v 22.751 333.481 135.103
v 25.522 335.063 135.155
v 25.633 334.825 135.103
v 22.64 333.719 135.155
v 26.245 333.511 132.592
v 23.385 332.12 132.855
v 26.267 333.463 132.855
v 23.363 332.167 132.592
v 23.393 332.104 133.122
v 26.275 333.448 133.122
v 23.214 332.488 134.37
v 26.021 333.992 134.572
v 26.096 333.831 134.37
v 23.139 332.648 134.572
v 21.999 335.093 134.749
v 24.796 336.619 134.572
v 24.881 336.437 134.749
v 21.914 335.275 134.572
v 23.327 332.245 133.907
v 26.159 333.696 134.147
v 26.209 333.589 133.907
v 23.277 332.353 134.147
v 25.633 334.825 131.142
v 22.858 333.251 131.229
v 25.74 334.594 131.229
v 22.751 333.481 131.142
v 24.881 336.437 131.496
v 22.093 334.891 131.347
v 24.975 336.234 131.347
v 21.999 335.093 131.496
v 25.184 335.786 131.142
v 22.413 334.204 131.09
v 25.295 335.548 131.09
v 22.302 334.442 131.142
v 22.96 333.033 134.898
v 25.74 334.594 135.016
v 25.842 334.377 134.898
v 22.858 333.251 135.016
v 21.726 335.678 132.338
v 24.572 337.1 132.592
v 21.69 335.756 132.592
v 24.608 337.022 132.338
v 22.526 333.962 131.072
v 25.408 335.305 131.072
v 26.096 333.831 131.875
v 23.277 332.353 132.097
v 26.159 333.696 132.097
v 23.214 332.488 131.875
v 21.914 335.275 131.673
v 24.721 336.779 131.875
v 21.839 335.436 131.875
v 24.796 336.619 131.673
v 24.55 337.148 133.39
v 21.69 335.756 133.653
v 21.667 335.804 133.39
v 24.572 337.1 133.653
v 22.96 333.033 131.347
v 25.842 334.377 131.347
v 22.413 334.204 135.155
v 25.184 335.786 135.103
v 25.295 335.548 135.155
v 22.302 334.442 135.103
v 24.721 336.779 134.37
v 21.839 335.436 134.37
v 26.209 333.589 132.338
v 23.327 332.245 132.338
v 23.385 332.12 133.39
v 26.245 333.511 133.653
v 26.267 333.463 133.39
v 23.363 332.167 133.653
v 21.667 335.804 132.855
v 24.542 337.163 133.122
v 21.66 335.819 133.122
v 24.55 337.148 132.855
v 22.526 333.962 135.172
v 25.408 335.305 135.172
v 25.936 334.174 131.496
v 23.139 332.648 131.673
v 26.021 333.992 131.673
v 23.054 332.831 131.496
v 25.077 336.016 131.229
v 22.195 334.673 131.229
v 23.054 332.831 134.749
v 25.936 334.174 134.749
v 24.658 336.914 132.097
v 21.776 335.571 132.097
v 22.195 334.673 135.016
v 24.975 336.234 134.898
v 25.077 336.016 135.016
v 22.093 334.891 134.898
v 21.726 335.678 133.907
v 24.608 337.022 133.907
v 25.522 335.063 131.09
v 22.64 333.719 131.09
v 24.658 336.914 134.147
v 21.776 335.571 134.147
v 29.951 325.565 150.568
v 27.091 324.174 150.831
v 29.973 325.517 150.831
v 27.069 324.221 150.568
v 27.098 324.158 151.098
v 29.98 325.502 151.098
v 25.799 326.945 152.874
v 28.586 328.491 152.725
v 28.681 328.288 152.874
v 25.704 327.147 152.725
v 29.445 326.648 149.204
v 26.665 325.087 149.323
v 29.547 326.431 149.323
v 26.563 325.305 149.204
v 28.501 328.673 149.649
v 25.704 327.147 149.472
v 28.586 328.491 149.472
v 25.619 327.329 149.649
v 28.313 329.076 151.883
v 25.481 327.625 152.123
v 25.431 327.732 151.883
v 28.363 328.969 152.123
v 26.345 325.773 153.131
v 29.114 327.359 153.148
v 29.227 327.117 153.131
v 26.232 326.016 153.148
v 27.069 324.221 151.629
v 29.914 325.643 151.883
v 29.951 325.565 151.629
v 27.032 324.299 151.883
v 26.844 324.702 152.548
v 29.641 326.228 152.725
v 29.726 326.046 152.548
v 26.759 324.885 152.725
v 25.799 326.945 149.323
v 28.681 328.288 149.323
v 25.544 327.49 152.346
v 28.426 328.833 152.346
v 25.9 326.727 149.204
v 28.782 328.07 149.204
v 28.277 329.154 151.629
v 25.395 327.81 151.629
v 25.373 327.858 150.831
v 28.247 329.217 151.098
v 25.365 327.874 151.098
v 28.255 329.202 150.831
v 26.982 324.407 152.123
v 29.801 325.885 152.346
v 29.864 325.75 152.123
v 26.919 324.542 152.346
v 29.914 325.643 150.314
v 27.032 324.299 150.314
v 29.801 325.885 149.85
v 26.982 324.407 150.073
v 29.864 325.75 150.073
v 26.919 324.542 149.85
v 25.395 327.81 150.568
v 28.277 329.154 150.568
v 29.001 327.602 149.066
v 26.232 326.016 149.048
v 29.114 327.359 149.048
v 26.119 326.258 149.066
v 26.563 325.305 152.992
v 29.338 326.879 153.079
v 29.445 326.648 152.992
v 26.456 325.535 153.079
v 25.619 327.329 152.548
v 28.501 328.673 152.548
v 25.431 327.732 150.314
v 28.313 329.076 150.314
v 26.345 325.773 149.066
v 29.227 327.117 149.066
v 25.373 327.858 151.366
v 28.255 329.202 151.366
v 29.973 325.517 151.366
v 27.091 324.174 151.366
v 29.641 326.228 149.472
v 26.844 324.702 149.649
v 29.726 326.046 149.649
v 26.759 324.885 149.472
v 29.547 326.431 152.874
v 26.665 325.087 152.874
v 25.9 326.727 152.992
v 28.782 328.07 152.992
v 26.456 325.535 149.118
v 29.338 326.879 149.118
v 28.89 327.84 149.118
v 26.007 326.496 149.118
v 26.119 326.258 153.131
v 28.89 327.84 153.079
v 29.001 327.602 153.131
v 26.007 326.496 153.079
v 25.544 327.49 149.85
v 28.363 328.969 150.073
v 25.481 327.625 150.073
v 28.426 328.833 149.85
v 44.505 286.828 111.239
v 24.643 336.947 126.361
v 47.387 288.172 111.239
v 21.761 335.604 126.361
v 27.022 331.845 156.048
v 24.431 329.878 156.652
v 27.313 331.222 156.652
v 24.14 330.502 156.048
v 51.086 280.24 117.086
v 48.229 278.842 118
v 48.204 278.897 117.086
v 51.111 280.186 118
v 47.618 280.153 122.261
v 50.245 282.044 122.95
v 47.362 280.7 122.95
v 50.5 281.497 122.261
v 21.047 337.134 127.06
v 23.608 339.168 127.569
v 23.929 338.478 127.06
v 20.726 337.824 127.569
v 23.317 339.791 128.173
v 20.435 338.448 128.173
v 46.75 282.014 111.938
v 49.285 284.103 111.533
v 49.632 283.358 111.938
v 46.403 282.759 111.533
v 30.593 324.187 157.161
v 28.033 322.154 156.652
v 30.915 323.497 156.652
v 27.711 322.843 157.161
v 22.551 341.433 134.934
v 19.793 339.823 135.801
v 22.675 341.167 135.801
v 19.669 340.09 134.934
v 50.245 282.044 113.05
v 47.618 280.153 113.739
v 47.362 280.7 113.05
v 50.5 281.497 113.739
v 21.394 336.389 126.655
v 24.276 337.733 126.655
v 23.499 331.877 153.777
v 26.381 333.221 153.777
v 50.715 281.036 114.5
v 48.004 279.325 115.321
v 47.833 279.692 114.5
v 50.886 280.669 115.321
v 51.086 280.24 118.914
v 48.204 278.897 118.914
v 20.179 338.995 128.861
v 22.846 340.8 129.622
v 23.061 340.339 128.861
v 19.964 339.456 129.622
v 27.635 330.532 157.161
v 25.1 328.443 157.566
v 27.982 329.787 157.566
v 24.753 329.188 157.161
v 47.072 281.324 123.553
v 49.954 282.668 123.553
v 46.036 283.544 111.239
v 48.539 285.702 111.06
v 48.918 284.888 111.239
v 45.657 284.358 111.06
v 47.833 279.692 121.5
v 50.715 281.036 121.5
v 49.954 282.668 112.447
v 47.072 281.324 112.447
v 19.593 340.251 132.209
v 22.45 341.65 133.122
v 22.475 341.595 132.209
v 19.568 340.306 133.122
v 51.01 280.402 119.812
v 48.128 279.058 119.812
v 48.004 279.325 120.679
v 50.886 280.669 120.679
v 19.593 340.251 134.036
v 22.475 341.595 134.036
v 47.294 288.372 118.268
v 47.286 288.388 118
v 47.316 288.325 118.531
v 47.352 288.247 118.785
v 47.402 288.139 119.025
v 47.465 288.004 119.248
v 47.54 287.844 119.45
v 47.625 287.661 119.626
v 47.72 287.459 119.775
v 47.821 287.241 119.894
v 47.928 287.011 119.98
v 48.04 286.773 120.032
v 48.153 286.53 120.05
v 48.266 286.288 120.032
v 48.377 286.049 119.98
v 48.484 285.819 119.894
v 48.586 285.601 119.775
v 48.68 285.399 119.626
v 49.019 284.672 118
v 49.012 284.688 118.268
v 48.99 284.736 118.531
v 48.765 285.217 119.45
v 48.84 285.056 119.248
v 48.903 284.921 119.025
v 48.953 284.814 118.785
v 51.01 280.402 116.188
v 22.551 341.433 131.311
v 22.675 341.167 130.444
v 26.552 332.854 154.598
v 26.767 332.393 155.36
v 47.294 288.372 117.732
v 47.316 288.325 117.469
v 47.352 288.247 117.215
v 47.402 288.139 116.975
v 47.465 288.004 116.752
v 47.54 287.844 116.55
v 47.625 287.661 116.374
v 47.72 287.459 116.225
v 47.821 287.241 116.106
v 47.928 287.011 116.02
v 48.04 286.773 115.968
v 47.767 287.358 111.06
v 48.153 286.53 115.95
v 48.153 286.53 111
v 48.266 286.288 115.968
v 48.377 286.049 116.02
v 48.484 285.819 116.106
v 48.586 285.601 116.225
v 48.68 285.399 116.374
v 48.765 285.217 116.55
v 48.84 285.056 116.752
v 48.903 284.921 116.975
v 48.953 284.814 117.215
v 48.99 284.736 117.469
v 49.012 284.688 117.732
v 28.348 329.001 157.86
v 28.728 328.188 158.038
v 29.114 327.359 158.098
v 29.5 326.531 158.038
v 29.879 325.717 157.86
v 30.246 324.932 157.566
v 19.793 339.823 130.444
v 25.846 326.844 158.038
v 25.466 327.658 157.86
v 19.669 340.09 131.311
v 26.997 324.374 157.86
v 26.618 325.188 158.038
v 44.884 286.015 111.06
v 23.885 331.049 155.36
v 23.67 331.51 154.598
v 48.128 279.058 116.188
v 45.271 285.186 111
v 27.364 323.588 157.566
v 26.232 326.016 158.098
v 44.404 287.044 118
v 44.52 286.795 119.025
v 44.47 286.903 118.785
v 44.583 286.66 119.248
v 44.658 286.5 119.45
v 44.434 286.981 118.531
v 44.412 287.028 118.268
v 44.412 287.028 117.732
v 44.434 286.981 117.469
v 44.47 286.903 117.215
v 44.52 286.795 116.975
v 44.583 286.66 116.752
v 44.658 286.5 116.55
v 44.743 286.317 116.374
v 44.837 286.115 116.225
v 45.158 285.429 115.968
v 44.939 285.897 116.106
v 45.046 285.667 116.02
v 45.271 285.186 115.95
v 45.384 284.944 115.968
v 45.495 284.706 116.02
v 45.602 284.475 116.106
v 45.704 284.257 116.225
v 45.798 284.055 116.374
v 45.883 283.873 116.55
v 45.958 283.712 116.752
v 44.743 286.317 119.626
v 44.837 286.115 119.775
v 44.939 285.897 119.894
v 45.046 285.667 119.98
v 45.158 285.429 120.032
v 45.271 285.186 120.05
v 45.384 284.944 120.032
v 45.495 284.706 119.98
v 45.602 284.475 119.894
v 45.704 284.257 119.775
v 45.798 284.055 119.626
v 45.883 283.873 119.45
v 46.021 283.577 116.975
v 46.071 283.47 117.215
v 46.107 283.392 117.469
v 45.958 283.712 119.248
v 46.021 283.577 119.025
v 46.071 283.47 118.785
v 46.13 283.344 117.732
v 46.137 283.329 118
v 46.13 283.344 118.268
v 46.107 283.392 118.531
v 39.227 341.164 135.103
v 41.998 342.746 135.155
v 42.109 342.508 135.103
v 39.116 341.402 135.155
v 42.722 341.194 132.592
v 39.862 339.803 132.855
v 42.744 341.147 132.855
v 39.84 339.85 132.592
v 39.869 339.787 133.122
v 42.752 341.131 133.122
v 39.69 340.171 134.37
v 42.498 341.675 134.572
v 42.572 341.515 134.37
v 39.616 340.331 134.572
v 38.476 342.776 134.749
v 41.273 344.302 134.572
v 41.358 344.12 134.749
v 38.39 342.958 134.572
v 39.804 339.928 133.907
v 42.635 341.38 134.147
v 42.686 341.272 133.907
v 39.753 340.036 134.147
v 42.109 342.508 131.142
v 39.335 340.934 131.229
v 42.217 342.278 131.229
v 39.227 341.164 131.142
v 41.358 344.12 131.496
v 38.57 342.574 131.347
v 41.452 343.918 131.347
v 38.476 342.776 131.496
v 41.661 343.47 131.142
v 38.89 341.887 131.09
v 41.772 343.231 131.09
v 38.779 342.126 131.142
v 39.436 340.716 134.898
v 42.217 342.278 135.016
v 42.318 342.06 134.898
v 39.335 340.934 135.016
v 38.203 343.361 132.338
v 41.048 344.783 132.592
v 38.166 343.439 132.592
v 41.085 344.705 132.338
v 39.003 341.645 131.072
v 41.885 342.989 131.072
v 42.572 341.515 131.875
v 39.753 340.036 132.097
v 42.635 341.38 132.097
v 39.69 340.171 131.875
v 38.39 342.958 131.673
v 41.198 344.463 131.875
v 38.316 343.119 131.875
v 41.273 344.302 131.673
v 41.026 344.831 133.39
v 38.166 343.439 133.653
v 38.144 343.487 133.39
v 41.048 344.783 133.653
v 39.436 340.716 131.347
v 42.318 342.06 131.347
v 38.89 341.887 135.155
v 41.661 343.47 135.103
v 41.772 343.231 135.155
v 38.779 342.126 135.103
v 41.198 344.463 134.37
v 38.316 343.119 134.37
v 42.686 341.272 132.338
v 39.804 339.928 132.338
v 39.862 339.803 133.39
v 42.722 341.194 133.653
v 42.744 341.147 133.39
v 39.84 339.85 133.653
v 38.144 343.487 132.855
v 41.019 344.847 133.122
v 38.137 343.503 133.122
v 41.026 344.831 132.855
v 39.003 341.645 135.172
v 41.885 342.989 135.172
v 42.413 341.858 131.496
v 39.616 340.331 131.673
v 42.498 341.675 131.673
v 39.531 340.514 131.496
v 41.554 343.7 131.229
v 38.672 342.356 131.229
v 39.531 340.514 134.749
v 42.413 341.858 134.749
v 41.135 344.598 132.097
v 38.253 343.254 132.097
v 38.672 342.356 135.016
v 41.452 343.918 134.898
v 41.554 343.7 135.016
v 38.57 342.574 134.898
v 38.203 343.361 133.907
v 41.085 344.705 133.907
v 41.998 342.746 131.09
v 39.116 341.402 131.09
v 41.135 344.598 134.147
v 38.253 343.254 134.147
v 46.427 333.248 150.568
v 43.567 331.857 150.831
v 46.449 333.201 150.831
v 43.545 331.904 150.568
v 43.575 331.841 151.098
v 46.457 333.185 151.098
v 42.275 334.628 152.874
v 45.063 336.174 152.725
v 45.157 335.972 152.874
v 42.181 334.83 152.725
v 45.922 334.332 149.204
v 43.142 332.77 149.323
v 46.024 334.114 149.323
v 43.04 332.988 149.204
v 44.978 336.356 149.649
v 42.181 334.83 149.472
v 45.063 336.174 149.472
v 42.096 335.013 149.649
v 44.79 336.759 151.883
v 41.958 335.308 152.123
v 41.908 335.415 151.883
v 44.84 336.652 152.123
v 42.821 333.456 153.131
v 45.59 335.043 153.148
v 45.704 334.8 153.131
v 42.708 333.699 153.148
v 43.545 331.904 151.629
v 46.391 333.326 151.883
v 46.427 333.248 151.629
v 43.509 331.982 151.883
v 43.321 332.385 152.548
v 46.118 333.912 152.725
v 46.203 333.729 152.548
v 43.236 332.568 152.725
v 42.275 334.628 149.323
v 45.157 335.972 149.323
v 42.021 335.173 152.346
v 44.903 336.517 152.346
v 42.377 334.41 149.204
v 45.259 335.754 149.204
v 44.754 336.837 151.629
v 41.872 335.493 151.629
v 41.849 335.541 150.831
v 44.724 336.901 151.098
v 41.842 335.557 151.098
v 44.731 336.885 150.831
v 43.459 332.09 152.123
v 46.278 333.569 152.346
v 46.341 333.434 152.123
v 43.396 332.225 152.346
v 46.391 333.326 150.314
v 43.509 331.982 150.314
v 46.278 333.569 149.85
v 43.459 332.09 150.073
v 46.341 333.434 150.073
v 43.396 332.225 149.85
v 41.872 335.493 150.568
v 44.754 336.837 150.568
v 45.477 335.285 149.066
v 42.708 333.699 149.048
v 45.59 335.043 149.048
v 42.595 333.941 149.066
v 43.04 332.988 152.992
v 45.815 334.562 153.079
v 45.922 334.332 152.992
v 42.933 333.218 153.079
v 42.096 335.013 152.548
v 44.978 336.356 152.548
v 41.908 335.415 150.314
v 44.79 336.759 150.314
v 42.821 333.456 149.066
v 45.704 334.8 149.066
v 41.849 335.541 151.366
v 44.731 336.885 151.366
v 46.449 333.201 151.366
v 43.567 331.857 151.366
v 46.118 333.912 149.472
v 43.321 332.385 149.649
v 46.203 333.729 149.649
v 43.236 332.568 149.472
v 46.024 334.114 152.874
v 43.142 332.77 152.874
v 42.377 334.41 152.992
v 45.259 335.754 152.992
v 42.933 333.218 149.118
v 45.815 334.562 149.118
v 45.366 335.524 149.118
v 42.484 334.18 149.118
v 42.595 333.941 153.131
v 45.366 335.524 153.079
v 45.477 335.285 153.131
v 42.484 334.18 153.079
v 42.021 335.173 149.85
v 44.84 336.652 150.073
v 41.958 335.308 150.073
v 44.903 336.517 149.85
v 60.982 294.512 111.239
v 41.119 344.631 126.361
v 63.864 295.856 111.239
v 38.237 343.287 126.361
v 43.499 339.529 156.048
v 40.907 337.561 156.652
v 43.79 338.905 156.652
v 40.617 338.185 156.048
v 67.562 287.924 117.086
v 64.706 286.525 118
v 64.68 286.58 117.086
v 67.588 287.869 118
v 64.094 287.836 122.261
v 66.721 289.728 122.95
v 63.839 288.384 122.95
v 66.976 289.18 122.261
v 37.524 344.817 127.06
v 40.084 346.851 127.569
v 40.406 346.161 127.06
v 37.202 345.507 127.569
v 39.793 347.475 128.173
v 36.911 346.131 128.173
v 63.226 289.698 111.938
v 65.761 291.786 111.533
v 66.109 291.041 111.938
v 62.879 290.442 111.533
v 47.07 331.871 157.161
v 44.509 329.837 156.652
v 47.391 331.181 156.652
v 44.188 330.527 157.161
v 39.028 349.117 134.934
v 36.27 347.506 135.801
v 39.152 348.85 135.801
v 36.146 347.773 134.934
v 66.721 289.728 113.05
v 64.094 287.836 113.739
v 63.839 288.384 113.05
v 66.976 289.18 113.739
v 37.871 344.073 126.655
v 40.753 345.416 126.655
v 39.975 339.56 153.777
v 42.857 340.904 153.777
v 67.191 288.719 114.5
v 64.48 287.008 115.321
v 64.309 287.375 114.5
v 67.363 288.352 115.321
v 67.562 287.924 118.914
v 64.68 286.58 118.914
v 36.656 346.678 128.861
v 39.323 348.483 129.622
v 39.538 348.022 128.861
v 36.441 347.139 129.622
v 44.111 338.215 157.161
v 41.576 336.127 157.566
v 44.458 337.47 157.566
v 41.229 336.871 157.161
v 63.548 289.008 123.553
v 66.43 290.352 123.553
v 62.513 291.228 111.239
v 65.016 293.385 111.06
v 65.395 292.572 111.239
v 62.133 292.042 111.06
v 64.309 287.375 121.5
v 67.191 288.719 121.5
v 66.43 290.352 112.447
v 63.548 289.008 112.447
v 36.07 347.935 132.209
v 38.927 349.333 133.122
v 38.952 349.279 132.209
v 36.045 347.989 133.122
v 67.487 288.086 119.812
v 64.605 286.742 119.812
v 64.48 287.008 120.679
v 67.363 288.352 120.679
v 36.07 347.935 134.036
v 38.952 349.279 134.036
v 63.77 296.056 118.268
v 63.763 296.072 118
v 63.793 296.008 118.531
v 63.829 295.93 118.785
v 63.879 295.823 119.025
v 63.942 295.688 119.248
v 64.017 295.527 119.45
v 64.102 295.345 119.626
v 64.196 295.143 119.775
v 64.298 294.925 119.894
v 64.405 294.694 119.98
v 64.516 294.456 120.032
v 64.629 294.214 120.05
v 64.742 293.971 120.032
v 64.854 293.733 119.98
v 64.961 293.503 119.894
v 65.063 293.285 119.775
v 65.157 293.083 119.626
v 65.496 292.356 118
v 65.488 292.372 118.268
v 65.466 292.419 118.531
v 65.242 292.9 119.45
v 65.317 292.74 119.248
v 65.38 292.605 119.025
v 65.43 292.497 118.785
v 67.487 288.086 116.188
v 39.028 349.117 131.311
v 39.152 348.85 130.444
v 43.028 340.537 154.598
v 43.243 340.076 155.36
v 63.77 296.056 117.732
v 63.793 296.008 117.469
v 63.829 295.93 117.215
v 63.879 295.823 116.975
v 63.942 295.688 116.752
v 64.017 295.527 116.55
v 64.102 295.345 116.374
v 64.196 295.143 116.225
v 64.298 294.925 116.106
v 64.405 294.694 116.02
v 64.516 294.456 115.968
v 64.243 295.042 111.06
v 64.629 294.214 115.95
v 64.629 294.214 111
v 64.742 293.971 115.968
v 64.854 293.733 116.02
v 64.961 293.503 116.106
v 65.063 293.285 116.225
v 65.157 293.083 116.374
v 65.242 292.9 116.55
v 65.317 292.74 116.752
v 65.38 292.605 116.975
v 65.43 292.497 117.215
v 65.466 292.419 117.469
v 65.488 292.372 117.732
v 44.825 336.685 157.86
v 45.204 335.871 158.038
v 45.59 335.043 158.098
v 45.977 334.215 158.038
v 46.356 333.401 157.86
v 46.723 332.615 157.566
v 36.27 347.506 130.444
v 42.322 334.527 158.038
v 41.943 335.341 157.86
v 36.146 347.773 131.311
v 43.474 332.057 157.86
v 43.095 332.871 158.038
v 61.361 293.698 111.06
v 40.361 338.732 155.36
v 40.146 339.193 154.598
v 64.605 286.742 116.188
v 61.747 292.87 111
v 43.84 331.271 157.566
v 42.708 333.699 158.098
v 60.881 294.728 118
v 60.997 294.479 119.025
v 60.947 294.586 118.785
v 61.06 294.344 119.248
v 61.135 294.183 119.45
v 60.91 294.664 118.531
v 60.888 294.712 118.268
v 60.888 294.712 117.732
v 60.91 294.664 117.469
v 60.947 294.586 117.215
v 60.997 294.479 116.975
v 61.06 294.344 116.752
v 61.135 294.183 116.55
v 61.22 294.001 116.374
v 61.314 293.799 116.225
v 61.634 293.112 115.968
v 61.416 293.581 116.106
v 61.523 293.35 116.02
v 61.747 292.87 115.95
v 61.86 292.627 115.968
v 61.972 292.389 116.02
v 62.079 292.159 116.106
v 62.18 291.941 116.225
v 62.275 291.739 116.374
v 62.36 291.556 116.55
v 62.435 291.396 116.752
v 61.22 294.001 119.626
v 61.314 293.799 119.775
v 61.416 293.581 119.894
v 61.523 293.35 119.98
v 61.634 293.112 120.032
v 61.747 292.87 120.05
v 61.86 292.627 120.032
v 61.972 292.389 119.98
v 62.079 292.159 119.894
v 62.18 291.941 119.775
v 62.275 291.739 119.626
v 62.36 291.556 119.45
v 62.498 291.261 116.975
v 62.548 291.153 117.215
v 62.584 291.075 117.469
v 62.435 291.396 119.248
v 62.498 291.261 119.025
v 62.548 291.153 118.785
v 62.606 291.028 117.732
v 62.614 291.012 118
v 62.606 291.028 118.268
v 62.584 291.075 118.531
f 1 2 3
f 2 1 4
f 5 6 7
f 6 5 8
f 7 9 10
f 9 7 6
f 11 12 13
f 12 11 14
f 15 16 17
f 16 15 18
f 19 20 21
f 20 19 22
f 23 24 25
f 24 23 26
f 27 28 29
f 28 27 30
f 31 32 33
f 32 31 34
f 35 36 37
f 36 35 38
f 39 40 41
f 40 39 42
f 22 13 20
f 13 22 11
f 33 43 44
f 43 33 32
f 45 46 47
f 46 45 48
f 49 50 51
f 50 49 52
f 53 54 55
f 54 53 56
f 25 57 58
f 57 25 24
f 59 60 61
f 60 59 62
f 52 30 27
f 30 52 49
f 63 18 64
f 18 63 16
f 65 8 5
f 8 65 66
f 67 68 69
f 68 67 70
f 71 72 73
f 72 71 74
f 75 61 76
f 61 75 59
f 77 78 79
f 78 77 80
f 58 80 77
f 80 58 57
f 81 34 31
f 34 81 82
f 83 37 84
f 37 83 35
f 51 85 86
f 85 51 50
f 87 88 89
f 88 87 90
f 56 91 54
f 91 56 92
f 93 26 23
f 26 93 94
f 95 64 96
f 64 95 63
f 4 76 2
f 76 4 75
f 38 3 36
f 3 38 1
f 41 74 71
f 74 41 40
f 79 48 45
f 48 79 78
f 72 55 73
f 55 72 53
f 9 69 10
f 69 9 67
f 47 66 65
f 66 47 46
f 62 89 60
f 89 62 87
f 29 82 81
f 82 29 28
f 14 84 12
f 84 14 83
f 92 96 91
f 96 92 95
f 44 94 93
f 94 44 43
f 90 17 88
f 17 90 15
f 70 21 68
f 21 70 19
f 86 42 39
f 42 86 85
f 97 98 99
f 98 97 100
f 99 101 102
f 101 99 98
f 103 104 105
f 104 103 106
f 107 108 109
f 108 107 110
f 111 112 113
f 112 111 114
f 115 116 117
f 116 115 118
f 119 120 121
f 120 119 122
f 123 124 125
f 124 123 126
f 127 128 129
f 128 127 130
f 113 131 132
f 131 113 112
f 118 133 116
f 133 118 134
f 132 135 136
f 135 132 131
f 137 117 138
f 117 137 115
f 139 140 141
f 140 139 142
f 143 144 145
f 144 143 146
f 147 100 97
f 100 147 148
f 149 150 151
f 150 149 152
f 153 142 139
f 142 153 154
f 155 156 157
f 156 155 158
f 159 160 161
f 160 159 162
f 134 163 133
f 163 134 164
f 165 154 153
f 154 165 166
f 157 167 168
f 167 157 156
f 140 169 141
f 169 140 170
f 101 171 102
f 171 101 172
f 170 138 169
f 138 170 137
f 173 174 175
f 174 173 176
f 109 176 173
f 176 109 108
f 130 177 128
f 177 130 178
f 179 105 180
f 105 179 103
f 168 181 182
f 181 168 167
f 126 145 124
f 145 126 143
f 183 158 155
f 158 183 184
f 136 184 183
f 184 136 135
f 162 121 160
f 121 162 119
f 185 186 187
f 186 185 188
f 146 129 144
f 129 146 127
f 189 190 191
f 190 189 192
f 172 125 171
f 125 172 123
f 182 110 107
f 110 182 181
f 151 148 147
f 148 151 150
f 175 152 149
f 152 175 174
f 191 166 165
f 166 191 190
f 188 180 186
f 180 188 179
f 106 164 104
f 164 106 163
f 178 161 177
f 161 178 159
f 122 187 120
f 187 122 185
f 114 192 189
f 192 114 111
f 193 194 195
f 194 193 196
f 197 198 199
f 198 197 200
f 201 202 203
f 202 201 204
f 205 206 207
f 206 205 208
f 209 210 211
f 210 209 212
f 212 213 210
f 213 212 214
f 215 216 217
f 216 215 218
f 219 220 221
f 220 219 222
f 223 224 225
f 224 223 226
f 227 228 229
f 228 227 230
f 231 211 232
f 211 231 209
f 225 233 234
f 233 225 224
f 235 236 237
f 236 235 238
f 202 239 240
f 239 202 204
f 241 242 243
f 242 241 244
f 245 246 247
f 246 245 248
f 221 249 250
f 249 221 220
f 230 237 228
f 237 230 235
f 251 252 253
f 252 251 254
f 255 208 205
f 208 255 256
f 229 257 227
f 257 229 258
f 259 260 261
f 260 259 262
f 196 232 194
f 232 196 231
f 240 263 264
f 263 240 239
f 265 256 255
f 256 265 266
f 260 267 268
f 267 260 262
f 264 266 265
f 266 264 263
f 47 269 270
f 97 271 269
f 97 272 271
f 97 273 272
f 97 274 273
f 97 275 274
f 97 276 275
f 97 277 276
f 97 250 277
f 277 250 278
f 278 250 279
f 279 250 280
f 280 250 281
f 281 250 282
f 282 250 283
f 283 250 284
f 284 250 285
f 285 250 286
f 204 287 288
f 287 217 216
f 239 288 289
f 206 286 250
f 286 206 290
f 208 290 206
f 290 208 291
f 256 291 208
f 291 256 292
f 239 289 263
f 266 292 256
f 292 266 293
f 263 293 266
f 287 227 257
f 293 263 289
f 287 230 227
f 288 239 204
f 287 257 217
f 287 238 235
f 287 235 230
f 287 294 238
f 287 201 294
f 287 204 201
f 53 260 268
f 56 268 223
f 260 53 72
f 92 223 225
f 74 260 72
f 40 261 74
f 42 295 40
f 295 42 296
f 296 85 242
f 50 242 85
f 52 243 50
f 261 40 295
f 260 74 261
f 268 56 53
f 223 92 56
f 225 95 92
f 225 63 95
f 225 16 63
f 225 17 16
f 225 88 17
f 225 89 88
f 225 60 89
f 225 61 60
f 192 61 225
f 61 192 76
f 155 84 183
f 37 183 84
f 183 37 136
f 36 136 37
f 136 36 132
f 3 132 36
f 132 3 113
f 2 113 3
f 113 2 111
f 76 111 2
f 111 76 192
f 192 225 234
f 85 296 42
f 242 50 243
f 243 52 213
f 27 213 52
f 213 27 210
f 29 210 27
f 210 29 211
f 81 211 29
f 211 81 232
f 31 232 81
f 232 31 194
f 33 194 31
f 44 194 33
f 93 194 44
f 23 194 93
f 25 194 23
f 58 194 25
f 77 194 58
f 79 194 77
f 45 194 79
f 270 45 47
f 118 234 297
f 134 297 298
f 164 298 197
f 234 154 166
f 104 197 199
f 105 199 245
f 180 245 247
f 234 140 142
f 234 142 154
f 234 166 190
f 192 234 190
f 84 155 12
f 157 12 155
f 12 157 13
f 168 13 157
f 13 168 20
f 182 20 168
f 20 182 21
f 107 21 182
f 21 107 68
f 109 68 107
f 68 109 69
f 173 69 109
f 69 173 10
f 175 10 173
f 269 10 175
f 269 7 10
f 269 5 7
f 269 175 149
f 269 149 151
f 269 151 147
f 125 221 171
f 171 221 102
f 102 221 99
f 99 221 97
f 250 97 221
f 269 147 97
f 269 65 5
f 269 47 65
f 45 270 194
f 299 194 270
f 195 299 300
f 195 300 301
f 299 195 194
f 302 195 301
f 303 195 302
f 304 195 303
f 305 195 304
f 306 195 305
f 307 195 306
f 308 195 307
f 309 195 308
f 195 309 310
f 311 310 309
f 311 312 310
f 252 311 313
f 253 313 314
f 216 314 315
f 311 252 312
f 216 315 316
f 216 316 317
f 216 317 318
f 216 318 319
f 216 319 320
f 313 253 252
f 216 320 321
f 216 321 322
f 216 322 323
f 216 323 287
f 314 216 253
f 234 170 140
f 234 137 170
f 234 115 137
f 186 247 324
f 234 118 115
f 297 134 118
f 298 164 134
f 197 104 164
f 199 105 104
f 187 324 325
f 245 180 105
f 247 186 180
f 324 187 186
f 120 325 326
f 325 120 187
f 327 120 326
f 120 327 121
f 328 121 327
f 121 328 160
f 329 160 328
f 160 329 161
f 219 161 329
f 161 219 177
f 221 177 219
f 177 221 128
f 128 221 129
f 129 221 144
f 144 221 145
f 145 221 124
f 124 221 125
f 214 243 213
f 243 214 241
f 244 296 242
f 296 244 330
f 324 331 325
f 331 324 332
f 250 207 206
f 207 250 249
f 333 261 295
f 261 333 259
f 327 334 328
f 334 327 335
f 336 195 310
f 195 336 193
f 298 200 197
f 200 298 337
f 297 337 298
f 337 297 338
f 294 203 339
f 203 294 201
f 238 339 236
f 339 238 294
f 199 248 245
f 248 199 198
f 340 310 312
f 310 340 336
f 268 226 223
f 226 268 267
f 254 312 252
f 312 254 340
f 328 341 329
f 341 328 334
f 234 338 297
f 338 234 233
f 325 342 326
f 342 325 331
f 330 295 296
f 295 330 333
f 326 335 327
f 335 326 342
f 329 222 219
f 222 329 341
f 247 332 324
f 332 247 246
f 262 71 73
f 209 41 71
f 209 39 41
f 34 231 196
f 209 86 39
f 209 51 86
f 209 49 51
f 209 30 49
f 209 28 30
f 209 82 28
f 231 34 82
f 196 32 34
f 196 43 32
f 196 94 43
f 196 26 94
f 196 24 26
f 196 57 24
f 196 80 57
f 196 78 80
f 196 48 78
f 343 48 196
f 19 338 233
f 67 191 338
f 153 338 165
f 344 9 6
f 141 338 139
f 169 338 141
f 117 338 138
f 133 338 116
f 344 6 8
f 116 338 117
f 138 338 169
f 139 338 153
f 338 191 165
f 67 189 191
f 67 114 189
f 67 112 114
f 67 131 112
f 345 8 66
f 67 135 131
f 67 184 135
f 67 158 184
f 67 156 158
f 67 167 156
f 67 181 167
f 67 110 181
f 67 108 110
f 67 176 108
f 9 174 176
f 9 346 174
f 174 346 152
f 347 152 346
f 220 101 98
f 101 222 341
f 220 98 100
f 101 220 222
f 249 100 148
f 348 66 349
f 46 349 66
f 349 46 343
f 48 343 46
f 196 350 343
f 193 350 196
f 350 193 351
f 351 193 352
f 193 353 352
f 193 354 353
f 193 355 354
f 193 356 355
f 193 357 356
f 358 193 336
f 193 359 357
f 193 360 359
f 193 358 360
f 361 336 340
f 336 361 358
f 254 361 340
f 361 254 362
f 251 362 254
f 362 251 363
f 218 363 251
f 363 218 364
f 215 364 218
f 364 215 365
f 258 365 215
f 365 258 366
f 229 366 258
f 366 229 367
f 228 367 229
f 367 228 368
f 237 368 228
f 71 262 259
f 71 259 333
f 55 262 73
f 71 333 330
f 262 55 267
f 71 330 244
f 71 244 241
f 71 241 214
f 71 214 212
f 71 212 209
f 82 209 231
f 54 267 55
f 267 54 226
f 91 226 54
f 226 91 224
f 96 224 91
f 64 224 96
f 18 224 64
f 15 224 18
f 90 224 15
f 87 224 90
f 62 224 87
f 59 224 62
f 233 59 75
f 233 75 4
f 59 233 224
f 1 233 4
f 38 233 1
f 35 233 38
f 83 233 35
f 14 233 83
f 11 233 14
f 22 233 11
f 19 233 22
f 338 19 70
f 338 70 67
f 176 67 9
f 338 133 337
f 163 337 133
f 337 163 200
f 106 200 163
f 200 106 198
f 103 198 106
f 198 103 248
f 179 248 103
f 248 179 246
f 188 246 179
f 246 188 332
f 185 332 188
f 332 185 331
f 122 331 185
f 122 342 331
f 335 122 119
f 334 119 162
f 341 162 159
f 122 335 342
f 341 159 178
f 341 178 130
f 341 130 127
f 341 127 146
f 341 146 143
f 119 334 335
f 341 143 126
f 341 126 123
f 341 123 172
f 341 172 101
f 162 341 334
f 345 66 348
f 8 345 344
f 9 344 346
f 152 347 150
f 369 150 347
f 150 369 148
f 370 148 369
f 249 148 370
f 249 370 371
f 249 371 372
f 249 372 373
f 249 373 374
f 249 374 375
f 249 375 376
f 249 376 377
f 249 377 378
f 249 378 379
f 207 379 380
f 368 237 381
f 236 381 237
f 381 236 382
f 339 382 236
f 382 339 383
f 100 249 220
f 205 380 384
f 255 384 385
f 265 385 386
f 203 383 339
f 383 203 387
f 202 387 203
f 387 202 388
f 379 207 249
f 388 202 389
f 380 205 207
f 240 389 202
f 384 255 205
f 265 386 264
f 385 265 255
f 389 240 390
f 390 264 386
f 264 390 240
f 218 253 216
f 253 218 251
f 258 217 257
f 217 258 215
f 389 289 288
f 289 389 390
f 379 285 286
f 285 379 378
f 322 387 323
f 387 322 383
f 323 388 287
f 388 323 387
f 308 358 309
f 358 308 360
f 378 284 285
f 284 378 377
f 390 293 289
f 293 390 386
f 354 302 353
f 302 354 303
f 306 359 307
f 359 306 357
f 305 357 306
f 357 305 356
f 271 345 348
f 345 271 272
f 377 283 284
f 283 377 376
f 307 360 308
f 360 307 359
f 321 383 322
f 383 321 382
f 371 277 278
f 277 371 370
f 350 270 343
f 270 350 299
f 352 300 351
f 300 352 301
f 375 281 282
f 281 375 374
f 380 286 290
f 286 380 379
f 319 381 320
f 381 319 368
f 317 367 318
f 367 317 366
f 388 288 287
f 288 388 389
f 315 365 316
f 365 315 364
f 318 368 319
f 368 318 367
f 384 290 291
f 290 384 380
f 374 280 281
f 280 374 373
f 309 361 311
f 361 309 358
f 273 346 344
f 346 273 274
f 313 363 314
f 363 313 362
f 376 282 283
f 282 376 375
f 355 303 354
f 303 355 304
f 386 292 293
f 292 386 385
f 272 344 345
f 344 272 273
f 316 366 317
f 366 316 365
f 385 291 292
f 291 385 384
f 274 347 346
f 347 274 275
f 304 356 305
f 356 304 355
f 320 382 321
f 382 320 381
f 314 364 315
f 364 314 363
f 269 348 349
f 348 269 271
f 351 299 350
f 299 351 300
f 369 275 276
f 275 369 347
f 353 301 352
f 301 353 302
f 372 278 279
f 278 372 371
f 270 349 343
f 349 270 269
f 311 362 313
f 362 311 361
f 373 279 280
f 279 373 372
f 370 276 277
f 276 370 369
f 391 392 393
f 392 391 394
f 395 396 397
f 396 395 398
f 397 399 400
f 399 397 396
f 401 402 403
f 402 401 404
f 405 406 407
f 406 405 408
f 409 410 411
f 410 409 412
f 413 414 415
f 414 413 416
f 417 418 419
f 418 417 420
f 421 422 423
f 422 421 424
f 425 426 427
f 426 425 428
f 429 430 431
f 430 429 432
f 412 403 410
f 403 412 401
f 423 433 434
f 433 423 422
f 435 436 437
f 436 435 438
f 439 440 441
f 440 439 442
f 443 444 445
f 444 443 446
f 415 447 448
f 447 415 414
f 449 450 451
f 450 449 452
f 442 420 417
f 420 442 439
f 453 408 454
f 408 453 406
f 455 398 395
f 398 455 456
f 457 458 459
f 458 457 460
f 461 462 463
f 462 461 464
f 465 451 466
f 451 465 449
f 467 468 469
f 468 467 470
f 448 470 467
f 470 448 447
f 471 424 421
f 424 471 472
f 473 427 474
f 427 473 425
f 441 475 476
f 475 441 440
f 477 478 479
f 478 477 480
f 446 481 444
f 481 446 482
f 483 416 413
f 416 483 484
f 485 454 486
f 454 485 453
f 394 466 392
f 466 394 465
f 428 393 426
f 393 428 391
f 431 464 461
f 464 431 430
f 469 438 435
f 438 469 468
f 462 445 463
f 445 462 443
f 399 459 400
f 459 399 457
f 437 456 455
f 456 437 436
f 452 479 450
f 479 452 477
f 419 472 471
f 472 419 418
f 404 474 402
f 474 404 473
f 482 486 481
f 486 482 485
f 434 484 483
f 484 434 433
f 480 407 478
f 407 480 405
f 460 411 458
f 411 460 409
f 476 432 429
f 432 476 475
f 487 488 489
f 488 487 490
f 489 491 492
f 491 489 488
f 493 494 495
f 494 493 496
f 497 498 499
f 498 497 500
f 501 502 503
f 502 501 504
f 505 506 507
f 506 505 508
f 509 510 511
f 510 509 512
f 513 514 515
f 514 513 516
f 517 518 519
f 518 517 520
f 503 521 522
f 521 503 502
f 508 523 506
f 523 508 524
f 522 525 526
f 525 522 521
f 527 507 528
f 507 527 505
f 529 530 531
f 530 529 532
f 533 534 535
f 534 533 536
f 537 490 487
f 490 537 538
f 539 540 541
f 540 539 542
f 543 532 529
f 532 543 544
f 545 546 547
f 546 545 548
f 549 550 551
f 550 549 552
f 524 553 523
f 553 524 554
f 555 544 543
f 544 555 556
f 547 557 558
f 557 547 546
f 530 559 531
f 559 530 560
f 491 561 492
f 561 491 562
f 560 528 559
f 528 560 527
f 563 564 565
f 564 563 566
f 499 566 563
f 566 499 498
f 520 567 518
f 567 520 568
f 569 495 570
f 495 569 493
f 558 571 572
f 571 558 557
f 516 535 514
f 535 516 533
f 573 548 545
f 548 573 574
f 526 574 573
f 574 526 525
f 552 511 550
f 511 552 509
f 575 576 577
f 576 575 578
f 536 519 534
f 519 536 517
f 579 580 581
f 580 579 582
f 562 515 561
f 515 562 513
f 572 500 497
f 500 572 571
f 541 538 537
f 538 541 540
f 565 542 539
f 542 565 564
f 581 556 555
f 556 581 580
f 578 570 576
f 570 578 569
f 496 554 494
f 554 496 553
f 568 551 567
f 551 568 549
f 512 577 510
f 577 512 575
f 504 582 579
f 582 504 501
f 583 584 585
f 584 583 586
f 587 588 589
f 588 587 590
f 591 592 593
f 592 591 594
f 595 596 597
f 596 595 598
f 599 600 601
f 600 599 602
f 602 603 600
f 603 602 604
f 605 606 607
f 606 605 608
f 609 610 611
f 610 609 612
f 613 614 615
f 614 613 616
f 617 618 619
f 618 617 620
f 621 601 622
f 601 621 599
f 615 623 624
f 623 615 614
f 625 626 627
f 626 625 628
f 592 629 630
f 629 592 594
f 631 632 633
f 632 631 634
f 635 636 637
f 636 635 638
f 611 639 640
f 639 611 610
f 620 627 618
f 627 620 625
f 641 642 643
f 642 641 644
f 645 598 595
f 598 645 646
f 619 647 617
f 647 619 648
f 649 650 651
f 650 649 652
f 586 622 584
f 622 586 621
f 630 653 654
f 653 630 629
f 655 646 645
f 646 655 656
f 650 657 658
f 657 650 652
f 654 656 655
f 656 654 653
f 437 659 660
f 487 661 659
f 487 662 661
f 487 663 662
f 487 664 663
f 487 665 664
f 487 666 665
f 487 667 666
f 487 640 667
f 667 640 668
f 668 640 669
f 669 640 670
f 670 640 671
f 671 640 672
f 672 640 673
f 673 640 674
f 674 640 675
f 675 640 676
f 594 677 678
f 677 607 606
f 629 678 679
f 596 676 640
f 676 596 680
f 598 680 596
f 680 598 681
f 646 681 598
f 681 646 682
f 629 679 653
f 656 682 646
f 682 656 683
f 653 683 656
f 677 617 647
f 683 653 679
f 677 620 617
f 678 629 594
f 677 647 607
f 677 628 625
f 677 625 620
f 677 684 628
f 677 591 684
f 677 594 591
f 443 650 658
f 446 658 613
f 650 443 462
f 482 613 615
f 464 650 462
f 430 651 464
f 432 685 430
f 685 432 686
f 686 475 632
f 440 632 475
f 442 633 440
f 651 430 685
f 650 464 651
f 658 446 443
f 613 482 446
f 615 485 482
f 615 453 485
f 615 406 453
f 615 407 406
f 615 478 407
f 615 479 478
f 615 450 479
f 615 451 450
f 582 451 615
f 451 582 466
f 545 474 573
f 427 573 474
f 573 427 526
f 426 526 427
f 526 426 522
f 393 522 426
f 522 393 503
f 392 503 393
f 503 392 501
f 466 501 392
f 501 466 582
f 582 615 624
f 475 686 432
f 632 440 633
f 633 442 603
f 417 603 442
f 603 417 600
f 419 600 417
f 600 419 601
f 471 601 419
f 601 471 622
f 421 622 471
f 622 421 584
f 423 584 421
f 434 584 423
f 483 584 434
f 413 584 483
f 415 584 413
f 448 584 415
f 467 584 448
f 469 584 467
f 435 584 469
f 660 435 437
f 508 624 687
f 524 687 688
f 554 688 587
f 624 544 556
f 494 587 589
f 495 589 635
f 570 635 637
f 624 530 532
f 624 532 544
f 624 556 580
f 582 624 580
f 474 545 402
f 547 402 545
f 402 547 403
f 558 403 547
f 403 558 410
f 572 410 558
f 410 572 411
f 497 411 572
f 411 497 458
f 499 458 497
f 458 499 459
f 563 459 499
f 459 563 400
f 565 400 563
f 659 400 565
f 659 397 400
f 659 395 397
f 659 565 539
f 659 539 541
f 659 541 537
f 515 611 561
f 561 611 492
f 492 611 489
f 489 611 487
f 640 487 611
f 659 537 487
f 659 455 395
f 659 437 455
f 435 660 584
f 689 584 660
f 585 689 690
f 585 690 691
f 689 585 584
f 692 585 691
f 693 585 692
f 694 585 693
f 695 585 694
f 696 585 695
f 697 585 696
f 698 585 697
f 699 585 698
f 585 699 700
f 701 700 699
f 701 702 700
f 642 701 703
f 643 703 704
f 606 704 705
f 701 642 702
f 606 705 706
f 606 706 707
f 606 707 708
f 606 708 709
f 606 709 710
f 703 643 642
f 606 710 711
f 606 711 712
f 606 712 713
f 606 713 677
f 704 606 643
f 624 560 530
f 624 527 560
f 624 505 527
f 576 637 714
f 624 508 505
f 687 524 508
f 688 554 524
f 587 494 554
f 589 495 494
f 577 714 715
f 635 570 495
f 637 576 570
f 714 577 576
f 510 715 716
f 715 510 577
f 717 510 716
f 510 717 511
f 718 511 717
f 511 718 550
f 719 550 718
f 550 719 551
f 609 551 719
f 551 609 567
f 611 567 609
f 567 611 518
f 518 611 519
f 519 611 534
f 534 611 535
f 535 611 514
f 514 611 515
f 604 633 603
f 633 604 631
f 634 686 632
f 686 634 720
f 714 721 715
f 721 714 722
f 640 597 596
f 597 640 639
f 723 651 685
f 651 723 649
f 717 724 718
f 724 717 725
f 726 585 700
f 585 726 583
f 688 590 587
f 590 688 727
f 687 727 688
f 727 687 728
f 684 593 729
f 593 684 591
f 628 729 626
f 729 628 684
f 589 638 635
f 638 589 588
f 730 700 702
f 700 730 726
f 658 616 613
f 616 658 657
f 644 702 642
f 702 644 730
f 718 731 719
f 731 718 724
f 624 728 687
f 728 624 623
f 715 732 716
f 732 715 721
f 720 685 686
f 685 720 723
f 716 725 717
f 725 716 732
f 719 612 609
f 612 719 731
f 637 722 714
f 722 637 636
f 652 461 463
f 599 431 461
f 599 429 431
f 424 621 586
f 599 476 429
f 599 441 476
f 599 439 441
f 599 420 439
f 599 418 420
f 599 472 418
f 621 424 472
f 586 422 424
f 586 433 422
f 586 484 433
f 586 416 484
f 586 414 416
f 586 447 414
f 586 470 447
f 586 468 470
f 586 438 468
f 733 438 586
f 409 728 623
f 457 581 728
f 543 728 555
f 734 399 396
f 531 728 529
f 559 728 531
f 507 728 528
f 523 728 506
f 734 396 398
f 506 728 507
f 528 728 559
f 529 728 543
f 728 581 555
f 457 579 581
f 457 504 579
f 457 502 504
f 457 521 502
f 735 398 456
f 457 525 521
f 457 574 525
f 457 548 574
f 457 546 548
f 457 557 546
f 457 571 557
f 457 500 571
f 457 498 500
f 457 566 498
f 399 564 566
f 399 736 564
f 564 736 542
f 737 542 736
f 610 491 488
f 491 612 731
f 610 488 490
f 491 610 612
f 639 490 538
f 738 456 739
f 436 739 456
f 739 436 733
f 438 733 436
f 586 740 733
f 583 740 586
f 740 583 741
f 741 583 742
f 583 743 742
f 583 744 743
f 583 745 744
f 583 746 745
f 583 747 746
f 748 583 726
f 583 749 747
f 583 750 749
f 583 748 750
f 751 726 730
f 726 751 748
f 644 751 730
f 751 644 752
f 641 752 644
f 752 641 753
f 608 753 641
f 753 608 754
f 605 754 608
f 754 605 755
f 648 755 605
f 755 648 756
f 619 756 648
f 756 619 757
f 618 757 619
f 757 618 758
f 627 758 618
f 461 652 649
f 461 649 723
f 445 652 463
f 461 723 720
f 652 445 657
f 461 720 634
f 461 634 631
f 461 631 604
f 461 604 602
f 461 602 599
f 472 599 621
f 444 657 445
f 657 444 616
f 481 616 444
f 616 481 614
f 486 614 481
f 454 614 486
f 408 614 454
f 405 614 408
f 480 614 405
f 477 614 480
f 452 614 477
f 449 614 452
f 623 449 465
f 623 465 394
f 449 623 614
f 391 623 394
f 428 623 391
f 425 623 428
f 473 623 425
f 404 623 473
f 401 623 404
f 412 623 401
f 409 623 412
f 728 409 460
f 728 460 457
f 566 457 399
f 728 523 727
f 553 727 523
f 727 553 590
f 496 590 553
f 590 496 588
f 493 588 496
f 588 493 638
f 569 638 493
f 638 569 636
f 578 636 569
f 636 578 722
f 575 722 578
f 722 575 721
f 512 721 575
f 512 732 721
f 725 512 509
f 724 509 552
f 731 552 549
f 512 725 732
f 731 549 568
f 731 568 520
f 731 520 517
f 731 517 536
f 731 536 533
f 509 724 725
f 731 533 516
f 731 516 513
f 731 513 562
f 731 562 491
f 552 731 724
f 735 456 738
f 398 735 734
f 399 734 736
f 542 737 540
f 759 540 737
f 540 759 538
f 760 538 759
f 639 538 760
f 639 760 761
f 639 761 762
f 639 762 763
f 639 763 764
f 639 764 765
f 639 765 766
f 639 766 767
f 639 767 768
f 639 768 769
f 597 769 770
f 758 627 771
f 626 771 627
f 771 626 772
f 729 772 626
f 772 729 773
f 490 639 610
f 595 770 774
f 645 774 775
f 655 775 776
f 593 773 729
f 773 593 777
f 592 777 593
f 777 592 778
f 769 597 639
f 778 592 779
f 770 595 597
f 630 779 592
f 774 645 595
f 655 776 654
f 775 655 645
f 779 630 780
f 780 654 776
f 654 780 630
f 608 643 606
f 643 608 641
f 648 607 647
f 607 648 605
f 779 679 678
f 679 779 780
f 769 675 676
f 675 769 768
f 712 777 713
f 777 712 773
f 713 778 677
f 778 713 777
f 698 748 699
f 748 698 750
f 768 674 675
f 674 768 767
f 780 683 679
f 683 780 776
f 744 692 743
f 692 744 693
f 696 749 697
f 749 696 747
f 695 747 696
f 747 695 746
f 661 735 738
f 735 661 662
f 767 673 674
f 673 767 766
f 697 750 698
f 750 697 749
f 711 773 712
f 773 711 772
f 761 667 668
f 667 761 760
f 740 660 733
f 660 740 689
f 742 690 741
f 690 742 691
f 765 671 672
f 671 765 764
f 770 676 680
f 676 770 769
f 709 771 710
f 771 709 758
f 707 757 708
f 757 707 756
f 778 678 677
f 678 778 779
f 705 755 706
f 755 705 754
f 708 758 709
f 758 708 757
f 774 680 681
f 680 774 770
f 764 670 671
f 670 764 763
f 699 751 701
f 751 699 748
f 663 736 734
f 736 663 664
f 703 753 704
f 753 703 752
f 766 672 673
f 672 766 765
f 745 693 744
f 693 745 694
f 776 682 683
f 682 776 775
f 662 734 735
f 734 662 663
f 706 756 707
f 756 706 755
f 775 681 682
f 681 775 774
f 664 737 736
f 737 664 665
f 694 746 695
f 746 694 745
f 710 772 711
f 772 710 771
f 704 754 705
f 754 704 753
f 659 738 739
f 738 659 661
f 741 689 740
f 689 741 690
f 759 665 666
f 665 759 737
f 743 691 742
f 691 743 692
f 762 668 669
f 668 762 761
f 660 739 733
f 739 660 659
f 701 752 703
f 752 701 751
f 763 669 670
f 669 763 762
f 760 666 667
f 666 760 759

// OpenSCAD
// gear_box_cf_backbone_placed.scad -- the A1B CF backbone cheeks
// (canonical_leg_r6_3_0in.scad a1b_backbone()) placed at ONE corner in the
// hull frame, for the canonical gear-box fit renders.
//
// Run per corner, with that corner's station (the strut azimuth depends on it):
//   openscad -D 'BAY_STATION="fore"' -D CORNER=0 -o fore_port.stl <this>
//   openscad -D 'BAY_STATION="aft"'  -D CORNER=2 -o aft_port.stl  <this>
// CORNER indexes canonical_leg_r6_3_0in.scad CORNERS (0 fore-port,
// 1 fore-stbd, 2 aft-port, 3 aft-stbd).  Placement repeats hull_legs().
//
// Author: Claude (Claude Opus 5.5, Anthropic) under the direction of
// Stab-Rabbit-coding, per AGENTS.md AI attribution.
// License: CERN-OHL-P-2.0 (hardware source) -- see repo LICENSE files.

CORNER = 0;
include <canonical_leg_r6_3_0in.scad>
PART = "none";      // library mode: the included file emits nothing

c = CORNERS[CORNER];
translate([c[0], c[1], c[2]]) rotate([0, 0, c[3]])
    mirror([0, c[4] < 0 ? 1 : 0, 0]) a1b_backbone();
